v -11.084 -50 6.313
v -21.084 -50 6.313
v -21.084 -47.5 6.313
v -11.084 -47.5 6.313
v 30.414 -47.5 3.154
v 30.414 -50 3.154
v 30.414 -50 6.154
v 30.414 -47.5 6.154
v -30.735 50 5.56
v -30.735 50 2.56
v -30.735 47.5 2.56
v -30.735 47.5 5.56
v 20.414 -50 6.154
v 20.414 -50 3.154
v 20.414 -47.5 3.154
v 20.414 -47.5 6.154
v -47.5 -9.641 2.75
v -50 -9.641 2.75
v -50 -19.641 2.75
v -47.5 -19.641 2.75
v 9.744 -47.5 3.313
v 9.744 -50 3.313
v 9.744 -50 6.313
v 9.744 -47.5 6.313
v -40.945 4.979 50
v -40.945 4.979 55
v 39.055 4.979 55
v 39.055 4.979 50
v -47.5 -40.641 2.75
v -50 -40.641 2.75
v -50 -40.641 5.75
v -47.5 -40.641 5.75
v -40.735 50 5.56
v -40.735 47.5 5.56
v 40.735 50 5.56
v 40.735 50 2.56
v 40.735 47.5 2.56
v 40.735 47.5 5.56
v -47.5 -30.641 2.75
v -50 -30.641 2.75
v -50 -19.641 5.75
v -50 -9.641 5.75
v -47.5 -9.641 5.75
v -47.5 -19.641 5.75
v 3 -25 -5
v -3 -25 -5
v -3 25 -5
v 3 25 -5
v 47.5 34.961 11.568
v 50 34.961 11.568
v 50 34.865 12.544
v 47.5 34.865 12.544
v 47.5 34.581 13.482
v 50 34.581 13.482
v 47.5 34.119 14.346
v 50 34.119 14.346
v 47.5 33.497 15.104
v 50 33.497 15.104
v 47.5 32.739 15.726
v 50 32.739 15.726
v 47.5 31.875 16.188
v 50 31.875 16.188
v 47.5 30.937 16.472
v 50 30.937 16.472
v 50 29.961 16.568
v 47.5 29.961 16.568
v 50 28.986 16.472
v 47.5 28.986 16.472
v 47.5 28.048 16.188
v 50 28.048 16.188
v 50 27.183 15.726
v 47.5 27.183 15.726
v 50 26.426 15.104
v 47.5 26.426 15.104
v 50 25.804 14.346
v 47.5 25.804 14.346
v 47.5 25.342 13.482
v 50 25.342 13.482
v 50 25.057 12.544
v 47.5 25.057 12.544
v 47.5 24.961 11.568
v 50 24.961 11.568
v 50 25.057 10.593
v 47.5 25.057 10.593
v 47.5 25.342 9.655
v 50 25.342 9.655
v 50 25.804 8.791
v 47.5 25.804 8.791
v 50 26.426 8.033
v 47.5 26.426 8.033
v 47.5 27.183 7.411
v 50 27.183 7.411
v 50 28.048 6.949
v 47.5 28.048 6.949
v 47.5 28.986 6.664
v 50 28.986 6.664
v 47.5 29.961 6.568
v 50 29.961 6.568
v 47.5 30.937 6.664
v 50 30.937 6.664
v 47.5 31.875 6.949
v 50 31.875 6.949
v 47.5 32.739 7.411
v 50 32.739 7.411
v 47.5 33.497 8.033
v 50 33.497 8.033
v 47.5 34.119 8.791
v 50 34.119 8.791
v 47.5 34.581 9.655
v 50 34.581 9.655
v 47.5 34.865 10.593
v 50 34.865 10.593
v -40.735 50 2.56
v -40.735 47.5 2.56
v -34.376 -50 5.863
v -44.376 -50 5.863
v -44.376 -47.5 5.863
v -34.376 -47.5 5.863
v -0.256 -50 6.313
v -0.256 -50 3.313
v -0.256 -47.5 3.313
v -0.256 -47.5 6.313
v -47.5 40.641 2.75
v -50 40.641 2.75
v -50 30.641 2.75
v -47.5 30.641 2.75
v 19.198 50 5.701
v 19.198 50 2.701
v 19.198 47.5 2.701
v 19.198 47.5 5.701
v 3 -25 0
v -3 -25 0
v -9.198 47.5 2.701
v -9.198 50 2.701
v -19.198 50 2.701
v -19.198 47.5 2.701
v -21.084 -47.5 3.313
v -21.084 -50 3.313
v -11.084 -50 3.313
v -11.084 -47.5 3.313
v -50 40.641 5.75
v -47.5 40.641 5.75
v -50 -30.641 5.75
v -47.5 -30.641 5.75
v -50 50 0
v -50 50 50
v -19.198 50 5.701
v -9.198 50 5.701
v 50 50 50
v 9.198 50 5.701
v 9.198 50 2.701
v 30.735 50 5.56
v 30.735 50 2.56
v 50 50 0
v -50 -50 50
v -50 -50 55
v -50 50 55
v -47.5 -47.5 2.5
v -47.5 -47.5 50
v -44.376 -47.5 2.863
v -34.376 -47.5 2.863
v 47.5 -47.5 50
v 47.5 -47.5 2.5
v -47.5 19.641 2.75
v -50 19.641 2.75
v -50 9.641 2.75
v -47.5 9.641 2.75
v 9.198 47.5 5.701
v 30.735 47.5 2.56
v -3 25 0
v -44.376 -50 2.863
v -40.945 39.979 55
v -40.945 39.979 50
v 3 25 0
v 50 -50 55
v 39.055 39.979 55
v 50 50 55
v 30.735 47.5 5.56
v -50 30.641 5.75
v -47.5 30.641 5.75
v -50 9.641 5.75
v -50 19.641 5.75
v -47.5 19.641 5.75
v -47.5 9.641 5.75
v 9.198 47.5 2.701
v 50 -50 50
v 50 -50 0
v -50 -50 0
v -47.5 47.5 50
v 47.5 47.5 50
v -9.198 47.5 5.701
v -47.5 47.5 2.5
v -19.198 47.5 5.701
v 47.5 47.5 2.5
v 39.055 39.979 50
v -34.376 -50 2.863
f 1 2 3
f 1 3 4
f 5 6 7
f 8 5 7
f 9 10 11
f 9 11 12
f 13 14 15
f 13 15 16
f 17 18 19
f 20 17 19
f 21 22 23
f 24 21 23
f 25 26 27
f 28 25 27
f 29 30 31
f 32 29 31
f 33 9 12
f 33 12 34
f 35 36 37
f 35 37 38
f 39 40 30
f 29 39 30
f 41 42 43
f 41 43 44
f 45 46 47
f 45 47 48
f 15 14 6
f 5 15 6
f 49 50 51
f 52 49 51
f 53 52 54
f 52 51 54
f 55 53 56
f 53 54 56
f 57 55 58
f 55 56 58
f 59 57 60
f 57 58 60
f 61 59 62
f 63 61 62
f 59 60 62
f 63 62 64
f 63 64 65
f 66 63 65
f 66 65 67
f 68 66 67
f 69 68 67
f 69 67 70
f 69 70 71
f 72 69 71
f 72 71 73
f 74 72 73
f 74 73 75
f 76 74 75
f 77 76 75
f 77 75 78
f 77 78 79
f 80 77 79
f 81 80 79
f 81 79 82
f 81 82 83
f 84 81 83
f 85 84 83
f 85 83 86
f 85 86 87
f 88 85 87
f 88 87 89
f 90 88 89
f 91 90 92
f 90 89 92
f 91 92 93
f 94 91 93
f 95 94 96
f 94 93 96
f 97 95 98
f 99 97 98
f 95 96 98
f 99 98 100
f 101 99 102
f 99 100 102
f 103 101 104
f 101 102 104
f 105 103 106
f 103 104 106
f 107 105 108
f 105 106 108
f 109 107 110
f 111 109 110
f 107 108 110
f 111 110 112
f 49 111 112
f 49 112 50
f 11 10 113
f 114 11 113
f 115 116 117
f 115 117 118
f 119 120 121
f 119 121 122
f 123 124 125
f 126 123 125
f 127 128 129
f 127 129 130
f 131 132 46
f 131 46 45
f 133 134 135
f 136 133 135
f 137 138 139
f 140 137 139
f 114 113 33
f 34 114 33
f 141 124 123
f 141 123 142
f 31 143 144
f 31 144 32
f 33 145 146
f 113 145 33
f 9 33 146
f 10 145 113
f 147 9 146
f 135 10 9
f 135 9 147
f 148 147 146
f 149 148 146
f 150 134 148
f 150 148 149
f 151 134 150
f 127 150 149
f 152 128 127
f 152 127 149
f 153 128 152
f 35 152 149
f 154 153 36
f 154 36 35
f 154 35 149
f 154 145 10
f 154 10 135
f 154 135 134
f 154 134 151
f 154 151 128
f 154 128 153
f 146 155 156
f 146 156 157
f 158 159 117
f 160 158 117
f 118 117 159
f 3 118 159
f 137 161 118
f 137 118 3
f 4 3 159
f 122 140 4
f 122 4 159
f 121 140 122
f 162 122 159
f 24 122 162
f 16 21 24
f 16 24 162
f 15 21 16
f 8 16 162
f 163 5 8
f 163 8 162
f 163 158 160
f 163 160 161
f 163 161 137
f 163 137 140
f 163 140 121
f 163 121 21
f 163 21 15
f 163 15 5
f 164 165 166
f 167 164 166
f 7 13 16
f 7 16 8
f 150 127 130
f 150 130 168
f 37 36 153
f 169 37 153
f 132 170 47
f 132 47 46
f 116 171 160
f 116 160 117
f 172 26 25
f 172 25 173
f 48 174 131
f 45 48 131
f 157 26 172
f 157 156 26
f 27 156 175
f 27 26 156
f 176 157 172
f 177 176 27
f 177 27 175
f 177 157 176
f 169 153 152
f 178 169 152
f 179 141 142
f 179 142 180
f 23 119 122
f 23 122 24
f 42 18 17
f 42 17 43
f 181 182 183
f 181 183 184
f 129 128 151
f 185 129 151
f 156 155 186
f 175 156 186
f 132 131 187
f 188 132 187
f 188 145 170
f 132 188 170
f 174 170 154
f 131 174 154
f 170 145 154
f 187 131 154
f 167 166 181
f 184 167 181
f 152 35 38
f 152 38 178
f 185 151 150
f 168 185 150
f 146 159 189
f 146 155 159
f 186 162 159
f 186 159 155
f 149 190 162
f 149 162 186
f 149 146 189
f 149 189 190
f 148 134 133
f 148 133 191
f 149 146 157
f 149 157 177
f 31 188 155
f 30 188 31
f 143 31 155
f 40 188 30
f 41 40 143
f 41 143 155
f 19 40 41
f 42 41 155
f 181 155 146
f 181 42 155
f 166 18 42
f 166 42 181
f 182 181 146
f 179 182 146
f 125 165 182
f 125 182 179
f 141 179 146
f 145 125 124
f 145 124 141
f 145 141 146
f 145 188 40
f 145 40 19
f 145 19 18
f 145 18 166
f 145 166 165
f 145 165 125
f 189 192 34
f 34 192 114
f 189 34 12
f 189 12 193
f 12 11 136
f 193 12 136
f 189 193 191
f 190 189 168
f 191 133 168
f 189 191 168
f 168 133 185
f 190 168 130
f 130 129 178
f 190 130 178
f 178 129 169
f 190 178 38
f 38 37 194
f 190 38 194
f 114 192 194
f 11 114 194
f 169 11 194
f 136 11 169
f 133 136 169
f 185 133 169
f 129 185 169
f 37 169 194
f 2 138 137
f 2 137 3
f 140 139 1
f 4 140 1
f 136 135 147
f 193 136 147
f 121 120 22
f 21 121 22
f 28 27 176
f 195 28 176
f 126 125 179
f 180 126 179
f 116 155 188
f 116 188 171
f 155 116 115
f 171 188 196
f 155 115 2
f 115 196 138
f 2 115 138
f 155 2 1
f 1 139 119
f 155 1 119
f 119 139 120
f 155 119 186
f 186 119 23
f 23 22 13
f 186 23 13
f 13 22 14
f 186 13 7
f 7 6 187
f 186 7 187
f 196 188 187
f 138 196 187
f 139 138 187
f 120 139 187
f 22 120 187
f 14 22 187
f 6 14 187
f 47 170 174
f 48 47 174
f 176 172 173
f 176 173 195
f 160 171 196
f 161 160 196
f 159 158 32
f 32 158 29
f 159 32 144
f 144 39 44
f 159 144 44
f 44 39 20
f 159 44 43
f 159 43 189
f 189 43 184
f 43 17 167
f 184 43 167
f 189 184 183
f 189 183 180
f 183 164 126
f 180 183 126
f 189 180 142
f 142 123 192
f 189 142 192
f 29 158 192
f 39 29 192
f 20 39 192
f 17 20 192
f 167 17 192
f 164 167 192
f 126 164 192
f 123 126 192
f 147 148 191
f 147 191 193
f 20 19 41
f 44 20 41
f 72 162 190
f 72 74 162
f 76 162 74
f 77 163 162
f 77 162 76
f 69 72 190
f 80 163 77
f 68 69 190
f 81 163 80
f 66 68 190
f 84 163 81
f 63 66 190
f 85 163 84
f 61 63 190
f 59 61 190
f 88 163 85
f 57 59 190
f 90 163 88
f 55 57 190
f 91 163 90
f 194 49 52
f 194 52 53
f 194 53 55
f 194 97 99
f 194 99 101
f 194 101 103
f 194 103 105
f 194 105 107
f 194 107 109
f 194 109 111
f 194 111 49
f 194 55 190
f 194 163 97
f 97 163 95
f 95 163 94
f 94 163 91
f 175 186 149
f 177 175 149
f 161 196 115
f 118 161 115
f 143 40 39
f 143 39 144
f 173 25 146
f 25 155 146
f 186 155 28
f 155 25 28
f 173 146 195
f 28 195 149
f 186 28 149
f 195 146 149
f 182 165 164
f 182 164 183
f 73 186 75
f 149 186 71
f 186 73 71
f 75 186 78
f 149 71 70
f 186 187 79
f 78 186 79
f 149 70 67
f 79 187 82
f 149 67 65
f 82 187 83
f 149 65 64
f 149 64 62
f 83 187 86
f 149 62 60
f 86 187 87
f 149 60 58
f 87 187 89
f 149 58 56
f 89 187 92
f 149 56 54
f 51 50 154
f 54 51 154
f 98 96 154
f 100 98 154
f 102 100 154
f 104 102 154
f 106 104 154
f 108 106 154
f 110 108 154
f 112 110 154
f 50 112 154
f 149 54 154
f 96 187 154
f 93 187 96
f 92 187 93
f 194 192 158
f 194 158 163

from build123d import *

# Parameters (mm, degrees)
F0_W      = 100
F0_H      = 100
F1_DEPTH  = 50
F2_T      = -2.5
F3_W      = 10
F3_H      = 3
F4_DEPTH  = 10
F5_W      = 10
F5_H      = 3
F6_DEPTH  = 10
F7_W      = 10
F7_H      = 3
F8_DEPTH  = 10
F9_R      = 5
F10_DEPTH = 10
F11_W     = 100
F11_H     = 100
F12_DEPTH = 5
F13_W     = 80
F13_H     = 35
F14_DEPTH = 5
F15_W     = 6
F15_H     = 50
F16_DEPTH = 5


with BuildPart() as f1:
    # F0 (on Top) → F1 (new body)
    with BuildSketch(Plane.XY):
        Rectangle(F0_W, F0_H)
    extrude(amount=F1_DEPTH)

    # F2
    f2_openings = [f1.faces().sort_by_distance(p)[0] for p in [
        (0, 0, 50),
    ]]
    offset(amount=F2_T, openings=f2_openings)

    # F3 (on face) → F4 (cut)
    with BuildSketch(Plane.XZ.offset(50)):
        with Locations((-39.376142, 4.362968)):
            Rectangle(F3_W, F3_H)
        with Locations((-16.083663, 4.813007)):
            Rectangle(F3_W, F3_H)
        with Locations((4.744422, 4.813007)):
            Rectangle(F3_W, F3_H)
        with Locations((25.413517, 4.654014)):
            Rectangle(F3_W, F3_H)
    extrude(amount=-F4_DEPTH, mode=Mode.SUBTRACT)

    # F5 (on face) → F6 (cut)
    with BuildSketch(Plane(origin=(0, 50, 0), x_dir=(-1, 0, 0), z_dir=(0, 1, 0))):
        with Locations((-35.735295, 4.059664)):
            Rectangle(F5_W, F5_H)
        with Locations((-14.198309, 4.20054)):
            Rectangle(F5_W, F5_H)
        with Locations((35.735295, 4.059664)):
            Rectangle(F5_W, F5_H)
        with Locations((14.198309, 4.20054)):
            Rectangle(F5_W, F5_H)
    extrude(amount=-F6_DEPTH, mode=Mode.SUBTRACT)

    # F7 (on face) → F8 (cut)
    with BuildSketch(Plane(origin=(-50, 0, 0), x_dir=(0, -1, 0), z_dir=(-1, 0, 0))):
        with Locations((-35.640758, 4.249729)):
            Rectangle(F7_W, F7_H)
        with Locations((-14.640759, 4.249729)):
            Rectangle(F7_W, F7_H)
        with Locations((35.640758, 4.249729)):
            Rectangle(F7_W, F7_H)
        with Locations((14.640759, 4.249729)):
            Rectangle(F7_W, F7_H)
    extrude(amount=-F8_DEPTH, mode=Mode.SUBTRACT)

    # F9 (on face) → F10 (cut)
    with BuildSketch(Plane.YZ.offset(50)):
        with Locations((29.961344, 11.568412)):
            Circle(F9_R)
    extrude(amount=-F10_DEPTH, mode=Mode.SUBTRACT)

    # F15 (on face) → F16 (join)
    with BuildSketch(Plane(origin=(0, 0, 0), x_dir=(1, 0, 0), z_dir=(0, 0, -1))):
        Rectangle(F15_W, F15_H)
    extrude(amount=F16_DEPTH)


with BuildPart() as f12:
    # F11 (on face) → F12 (new body)
    with BuildSketch(Plane.XY.offset(50)):
        Rectangle(F11_W, F11_H)
    extrude(amount=F12_DEPTH)

    # F13 (on face) → F14 (cut)
    with BuildSketch(Plane.XY.offset(55)):
        with Locations((-0.945378, 22.478993)):
            Rectangle(F13_W, F13_H)
    extrude(amount=-F14_DEPTH, mode=Mode.SUBTRACT)


solid = Compound([f1.part, f12.part])
